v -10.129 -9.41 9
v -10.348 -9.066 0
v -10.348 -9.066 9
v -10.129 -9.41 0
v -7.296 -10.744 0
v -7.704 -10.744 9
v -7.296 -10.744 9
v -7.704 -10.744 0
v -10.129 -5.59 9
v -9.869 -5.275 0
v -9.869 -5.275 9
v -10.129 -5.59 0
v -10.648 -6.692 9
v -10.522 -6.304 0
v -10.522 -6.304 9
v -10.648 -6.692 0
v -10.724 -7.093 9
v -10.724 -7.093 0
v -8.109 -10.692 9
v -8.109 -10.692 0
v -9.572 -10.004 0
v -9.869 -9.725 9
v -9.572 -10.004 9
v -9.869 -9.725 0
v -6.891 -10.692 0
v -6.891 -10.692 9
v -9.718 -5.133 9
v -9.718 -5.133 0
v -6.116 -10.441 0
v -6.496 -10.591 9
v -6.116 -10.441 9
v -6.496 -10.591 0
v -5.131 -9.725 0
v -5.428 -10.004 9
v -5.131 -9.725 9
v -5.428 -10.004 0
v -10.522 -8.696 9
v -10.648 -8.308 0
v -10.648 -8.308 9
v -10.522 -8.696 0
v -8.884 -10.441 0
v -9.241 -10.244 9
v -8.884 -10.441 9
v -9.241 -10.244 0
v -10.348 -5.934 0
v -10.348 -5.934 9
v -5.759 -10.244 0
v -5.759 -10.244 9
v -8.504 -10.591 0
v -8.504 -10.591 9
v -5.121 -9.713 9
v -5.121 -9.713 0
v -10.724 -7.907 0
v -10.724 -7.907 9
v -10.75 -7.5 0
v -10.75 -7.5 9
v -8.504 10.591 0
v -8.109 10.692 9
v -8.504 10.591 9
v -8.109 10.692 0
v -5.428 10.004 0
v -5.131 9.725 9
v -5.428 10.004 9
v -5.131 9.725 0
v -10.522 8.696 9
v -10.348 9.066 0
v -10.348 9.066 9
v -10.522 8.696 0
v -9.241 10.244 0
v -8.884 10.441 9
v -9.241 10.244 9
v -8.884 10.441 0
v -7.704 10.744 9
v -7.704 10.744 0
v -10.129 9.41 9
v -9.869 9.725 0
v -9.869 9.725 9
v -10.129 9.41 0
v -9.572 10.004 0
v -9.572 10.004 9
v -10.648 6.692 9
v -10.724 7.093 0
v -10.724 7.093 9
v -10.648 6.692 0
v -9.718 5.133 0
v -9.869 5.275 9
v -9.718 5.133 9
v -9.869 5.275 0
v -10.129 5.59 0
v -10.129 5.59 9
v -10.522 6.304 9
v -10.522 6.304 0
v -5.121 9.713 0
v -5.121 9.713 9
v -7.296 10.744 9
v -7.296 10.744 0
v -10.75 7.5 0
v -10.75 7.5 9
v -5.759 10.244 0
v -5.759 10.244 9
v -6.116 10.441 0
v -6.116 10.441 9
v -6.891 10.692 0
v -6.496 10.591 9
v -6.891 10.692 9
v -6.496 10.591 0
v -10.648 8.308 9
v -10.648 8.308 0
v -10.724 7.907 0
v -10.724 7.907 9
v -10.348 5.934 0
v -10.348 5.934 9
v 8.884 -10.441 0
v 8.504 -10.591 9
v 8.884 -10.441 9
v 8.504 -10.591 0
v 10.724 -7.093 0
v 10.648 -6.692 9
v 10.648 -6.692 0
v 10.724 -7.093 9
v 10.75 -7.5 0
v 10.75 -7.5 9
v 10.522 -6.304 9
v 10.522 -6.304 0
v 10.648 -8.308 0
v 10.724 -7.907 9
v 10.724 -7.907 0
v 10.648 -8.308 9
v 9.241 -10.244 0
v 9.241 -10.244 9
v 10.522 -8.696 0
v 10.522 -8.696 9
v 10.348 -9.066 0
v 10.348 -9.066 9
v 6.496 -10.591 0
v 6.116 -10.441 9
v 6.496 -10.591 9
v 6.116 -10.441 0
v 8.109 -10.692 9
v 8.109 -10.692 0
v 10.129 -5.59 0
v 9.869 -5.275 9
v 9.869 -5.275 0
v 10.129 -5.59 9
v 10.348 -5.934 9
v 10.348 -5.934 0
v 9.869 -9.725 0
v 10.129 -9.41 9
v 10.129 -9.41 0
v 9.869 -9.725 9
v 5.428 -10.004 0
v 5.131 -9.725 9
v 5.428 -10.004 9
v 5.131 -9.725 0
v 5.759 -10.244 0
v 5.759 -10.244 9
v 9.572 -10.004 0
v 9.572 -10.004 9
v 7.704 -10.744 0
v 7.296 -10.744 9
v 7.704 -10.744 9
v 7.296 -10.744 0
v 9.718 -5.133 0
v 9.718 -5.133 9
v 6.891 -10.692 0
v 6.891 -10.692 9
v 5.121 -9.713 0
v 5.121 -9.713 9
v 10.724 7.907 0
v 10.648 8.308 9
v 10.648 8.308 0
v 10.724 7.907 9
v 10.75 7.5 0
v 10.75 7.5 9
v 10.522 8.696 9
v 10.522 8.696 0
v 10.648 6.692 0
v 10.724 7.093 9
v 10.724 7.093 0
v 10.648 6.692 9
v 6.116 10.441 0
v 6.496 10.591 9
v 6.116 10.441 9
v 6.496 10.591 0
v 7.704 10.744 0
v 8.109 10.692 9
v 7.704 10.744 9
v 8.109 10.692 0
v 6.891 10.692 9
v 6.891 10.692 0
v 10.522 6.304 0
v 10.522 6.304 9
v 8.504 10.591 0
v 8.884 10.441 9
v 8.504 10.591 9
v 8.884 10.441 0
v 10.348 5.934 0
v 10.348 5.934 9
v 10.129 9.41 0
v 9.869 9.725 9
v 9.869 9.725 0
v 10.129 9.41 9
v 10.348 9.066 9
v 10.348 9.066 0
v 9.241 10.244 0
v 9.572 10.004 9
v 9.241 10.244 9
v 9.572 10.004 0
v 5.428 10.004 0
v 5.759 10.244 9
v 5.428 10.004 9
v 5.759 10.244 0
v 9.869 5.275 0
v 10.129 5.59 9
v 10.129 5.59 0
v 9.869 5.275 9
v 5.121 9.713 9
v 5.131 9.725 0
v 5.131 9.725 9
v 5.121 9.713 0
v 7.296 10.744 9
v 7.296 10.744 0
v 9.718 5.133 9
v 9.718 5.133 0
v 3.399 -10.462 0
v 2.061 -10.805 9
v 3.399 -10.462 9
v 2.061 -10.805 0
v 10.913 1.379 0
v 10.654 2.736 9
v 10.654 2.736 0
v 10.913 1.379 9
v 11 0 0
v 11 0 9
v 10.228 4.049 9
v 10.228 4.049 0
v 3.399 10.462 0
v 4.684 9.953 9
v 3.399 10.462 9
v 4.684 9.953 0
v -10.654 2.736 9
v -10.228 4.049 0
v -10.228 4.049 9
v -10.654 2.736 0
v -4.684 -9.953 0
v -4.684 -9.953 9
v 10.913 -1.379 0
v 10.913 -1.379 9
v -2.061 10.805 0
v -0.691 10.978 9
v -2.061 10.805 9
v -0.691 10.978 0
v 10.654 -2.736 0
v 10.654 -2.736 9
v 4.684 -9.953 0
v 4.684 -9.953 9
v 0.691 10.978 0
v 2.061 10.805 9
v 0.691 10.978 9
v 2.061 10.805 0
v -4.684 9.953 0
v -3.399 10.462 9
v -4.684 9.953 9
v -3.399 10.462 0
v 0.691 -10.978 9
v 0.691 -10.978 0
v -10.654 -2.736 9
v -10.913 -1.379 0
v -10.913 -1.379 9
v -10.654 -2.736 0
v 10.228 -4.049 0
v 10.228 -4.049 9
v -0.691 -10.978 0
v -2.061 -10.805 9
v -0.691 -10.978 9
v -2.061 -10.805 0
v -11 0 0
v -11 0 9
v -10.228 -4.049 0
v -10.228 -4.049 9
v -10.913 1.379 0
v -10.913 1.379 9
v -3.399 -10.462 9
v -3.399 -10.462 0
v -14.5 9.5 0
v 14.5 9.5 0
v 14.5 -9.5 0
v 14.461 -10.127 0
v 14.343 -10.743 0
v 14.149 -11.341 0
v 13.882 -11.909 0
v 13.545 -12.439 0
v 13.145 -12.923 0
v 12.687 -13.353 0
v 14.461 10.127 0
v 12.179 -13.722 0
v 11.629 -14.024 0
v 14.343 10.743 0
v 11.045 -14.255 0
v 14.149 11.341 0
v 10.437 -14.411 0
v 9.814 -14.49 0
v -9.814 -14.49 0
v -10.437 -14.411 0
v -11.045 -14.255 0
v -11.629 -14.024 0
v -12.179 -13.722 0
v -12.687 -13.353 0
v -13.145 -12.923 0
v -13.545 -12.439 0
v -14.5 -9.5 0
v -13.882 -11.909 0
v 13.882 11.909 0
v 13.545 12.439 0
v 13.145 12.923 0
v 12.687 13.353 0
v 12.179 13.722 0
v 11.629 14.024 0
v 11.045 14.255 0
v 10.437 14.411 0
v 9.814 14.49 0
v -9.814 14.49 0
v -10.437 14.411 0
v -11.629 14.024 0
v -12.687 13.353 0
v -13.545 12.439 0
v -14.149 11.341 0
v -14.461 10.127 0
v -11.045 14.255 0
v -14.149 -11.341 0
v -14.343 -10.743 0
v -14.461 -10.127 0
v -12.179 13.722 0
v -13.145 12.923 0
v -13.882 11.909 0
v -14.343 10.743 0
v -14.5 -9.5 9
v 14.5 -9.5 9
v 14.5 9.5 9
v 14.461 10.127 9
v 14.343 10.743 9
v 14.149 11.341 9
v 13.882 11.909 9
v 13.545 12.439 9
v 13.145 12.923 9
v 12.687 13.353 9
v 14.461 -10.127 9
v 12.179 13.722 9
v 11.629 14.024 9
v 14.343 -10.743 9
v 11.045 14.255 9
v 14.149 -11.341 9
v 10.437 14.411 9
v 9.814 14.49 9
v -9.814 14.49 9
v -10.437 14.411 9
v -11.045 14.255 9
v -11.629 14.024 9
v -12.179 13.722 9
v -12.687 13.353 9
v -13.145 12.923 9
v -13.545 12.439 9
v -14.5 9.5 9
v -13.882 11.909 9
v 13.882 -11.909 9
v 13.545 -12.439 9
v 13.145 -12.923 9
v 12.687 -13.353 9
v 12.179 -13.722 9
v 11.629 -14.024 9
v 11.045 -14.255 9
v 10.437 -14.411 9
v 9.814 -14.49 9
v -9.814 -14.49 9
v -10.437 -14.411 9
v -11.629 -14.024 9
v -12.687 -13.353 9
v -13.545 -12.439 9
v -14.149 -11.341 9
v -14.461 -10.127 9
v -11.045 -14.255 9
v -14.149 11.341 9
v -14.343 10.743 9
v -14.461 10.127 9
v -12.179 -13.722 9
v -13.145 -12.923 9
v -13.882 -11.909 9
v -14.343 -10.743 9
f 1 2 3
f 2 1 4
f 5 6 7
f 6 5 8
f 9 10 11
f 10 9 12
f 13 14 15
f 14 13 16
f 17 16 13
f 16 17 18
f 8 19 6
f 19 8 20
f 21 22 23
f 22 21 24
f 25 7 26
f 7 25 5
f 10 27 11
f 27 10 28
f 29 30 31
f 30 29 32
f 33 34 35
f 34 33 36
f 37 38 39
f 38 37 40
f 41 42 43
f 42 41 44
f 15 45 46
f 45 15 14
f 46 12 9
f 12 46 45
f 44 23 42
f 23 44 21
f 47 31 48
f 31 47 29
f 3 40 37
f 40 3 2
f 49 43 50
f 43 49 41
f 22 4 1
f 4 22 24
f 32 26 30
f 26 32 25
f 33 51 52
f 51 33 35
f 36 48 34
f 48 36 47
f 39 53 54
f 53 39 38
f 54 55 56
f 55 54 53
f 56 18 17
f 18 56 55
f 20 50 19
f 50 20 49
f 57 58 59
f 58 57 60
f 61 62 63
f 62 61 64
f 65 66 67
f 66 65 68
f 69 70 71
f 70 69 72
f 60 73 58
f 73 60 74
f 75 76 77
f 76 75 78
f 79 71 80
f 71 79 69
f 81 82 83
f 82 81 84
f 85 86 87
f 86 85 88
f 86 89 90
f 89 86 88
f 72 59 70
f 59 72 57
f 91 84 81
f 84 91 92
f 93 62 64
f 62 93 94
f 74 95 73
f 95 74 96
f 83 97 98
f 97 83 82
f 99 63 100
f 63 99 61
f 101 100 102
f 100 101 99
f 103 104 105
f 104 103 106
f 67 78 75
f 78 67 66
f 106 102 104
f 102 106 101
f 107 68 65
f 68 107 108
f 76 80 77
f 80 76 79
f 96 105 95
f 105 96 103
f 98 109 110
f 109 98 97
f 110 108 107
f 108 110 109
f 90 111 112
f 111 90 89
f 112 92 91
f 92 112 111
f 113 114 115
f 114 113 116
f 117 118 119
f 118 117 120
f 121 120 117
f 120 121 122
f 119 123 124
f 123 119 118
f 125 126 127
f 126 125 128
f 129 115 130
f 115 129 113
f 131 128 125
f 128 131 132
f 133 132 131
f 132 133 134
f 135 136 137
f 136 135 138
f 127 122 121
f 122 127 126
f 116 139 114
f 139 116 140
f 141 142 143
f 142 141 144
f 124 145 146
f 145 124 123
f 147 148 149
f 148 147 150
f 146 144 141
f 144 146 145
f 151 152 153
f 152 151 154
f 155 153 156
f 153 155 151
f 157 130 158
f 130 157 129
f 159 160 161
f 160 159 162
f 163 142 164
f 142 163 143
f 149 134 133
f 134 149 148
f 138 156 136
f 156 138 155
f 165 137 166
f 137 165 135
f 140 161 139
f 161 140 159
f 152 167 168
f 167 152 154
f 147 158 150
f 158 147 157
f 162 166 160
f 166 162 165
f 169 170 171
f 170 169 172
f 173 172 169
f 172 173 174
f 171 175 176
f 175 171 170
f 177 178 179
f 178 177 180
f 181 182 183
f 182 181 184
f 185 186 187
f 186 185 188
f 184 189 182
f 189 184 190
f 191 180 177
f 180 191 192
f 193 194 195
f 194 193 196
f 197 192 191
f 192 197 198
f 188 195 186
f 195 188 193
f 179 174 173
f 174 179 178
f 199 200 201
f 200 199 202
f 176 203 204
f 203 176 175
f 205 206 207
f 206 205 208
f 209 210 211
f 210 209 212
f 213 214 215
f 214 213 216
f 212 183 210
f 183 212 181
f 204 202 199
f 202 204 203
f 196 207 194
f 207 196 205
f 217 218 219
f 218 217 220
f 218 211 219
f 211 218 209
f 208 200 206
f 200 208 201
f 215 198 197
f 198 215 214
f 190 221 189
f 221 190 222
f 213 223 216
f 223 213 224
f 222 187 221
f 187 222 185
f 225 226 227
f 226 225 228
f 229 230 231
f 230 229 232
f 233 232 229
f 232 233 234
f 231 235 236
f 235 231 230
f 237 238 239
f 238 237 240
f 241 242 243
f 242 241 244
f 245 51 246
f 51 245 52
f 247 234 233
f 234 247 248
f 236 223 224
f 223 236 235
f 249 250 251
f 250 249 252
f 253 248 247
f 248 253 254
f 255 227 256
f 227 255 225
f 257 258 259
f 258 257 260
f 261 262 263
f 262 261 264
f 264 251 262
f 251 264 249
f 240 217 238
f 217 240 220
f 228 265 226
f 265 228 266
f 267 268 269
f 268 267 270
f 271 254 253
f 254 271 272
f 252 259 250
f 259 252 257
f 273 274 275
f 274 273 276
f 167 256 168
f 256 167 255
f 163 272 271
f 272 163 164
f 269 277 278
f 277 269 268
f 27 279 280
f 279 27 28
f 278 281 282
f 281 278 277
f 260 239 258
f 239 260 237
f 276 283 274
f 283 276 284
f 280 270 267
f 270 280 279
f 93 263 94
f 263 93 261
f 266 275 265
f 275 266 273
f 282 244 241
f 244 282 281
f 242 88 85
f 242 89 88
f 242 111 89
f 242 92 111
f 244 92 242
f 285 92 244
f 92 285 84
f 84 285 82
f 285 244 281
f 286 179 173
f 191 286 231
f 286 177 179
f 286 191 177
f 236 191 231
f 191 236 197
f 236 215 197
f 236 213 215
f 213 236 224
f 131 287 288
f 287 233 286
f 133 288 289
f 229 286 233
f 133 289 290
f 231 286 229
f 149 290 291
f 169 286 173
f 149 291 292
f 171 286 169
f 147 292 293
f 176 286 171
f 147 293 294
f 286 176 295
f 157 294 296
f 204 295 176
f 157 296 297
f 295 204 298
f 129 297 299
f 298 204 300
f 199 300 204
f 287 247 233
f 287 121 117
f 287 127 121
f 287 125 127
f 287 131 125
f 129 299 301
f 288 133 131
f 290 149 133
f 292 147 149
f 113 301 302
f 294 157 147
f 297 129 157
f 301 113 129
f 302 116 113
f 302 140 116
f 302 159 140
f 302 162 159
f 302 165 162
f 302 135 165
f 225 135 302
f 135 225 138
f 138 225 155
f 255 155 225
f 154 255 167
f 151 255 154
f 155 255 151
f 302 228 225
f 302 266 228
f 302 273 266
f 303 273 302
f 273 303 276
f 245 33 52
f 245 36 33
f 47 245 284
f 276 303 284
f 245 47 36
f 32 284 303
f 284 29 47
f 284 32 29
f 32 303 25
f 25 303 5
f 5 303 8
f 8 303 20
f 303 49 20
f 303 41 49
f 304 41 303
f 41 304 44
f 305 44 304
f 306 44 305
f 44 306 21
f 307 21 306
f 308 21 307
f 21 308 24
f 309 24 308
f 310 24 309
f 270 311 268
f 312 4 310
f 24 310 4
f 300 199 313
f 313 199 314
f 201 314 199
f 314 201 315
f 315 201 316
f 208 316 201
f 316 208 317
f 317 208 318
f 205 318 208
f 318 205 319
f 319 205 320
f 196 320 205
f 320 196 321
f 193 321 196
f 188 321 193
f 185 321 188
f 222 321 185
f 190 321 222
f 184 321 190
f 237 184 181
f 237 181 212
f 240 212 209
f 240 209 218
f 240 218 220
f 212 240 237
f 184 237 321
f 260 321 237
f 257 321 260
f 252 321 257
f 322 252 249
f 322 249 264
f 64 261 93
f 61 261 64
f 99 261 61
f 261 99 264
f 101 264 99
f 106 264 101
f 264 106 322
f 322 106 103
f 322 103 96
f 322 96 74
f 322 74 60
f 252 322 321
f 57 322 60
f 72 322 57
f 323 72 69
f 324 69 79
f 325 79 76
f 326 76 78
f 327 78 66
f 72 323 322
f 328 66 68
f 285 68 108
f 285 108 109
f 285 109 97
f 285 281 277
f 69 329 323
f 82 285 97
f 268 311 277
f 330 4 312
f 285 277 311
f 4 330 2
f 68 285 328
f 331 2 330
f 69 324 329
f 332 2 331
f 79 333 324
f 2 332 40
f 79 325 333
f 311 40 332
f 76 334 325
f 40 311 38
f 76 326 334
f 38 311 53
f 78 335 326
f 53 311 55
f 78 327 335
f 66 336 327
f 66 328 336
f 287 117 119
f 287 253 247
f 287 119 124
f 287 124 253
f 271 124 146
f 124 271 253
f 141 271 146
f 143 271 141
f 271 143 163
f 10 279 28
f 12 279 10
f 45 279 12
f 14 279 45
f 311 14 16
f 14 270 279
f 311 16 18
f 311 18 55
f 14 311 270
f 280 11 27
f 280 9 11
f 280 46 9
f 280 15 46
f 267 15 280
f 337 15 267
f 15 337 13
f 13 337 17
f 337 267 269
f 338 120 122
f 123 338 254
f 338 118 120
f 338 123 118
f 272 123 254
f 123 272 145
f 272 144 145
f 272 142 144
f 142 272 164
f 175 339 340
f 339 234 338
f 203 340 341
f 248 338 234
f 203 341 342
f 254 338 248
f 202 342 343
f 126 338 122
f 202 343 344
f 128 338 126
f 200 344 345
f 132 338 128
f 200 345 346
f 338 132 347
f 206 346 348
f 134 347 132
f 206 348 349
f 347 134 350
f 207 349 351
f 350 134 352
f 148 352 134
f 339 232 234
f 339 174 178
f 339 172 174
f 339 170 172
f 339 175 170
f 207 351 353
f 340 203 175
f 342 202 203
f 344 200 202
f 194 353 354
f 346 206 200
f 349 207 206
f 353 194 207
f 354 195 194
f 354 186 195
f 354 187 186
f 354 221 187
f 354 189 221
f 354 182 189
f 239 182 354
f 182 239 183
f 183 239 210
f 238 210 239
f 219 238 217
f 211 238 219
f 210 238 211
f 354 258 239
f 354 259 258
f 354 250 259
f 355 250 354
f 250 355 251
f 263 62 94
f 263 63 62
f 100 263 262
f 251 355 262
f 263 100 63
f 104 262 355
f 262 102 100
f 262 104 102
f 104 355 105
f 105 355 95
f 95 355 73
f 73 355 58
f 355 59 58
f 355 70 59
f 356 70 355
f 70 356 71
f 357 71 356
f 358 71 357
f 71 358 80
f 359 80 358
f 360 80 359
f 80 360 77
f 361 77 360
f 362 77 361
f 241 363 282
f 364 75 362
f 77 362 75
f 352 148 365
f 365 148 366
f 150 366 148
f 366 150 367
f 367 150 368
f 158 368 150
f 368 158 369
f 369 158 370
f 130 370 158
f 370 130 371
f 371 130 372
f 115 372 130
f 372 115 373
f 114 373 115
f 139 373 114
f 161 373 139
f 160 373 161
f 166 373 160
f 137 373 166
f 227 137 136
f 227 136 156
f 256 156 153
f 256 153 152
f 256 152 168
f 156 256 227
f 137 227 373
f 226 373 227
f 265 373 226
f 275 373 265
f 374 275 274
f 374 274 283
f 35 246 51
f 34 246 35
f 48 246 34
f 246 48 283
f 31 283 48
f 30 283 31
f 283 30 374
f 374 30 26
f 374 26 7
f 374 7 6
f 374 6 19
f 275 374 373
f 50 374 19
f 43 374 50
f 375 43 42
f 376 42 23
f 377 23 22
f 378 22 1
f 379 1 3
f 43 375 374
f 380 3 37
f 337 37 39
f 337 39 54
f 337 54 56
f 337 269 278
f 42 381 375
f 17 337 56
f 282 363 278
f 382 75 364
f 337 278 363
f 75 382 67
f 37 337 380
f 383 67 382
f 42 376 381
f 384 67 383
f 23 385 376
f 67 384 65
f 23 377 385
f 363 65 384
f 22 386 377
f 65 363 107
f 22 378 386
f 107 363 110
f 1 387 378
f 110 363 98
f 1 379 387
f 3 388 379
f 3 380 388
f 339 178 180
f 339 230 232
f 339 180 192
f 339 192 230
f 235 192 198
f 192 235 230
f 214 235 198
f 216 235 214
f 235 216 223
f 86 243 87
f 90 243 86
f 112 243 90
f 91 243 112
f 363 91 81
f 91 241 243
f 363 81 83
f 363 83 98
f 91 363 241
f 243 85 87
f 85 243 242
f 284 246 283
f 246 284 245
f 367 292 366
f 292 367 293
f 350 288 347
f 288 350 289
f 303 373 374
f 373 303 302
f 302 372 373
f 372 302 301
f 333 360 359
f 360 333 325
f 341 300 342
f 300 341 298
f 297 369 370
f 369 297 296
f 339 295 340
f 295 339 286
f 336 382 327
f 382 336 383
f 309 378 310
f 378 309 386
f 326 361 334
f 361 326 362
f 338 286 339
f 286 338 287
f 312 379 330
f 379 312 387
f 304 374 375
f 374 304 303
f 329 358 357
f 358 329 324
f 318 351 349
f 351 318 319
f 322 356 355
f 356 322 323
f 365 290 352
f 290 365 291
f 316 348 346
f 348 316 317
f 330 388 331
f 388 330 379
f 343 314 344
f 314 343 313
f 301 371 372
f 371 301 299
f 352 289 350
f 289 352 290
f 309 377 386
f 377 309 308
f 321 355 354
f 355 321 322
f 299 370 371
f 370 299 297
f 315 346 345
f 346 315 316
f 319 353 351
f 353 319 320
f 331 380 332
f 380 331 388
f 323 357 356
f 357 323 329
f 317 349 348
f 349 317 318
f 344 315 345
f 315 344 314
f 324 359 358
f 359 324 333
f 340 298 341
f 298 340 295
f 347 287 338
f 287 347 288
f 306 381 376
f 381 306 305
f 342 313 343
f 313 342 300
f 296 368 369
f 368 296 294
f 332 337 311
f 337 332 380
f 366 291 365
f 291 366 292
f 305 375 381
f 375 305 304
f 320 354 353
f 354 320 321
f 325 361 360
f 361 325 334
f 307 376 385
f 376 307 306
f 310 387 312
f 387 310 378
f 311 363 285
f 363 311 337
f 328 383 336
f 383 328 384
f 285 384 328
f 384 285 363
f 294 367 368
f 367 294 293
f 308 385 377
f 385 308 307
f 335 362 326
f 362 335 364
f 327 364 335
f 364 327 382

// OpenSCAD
$fn = 50;


difference() {
	union() {
		hull() {
			translate(v = [-9.5000000000, 9.5000000000, 0]) {
				cylinder(h = 9, r = 5);
			}
			translate(v = [9.5000000000, 9.5000000000, 0]) {
				cylinder(h = 9, r = 5);
			}
			translate(v = [-9.5000000000, -9.5000000000, 0]) {
				cylinder(h = 9, r = 5);
			}
			translate(v = [9.5000000000, -9.5000000000, 0]) {
				cylinder(h = 9, r = 5);
			}
		}
	}
	union() {
		#translate(v = [-7.5000000000, -7.5000000000, -100.0000000000]) {
			cylinder(h = 200, r = 3.2500000000);
		}
		#translate(v = [-7.5000000000, 7.5000000000, -100.0000000000]) {
			cylinder(h = 200, r = 3.2500000000);
		}
		#translate(v = [7.5000000000, -7.5000000000, -100.0000000000]) {
			cylinder(h = 200, r = 3.2500000000);
		}
		#translate(v = [7.5000000000, 7.5000000000, -100.0000000000]) {
			cylinder(h = 200, r = 3.2500000000);
		}
		#cylinder(h = 9, r = 11.0000000000);
	}
}
